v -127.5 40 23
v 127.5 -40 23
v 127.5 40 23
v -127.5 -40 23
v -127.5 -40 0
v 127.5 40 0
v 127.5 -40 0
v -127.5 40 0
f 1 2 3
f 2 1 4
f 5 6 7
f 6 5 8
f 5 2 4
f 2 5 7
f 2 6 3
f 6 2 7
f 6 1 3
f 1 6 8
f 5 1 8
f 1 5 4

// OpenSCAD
// Generated documentary F1 envelope proxy.
// Not manufacturing geometry, not dimensionally validated, not SimReady.
proxy_id = "993-INTERCOOLER-BRACKET-REINFORCED";
$fn = 96;

length_mm = 255;
width_mm = 80;
height_mm = 23;

translate([-length_mm / 2, -width_mm / 2, 0])
    cube([length_mm, width_mm, height_mm], center = false);
